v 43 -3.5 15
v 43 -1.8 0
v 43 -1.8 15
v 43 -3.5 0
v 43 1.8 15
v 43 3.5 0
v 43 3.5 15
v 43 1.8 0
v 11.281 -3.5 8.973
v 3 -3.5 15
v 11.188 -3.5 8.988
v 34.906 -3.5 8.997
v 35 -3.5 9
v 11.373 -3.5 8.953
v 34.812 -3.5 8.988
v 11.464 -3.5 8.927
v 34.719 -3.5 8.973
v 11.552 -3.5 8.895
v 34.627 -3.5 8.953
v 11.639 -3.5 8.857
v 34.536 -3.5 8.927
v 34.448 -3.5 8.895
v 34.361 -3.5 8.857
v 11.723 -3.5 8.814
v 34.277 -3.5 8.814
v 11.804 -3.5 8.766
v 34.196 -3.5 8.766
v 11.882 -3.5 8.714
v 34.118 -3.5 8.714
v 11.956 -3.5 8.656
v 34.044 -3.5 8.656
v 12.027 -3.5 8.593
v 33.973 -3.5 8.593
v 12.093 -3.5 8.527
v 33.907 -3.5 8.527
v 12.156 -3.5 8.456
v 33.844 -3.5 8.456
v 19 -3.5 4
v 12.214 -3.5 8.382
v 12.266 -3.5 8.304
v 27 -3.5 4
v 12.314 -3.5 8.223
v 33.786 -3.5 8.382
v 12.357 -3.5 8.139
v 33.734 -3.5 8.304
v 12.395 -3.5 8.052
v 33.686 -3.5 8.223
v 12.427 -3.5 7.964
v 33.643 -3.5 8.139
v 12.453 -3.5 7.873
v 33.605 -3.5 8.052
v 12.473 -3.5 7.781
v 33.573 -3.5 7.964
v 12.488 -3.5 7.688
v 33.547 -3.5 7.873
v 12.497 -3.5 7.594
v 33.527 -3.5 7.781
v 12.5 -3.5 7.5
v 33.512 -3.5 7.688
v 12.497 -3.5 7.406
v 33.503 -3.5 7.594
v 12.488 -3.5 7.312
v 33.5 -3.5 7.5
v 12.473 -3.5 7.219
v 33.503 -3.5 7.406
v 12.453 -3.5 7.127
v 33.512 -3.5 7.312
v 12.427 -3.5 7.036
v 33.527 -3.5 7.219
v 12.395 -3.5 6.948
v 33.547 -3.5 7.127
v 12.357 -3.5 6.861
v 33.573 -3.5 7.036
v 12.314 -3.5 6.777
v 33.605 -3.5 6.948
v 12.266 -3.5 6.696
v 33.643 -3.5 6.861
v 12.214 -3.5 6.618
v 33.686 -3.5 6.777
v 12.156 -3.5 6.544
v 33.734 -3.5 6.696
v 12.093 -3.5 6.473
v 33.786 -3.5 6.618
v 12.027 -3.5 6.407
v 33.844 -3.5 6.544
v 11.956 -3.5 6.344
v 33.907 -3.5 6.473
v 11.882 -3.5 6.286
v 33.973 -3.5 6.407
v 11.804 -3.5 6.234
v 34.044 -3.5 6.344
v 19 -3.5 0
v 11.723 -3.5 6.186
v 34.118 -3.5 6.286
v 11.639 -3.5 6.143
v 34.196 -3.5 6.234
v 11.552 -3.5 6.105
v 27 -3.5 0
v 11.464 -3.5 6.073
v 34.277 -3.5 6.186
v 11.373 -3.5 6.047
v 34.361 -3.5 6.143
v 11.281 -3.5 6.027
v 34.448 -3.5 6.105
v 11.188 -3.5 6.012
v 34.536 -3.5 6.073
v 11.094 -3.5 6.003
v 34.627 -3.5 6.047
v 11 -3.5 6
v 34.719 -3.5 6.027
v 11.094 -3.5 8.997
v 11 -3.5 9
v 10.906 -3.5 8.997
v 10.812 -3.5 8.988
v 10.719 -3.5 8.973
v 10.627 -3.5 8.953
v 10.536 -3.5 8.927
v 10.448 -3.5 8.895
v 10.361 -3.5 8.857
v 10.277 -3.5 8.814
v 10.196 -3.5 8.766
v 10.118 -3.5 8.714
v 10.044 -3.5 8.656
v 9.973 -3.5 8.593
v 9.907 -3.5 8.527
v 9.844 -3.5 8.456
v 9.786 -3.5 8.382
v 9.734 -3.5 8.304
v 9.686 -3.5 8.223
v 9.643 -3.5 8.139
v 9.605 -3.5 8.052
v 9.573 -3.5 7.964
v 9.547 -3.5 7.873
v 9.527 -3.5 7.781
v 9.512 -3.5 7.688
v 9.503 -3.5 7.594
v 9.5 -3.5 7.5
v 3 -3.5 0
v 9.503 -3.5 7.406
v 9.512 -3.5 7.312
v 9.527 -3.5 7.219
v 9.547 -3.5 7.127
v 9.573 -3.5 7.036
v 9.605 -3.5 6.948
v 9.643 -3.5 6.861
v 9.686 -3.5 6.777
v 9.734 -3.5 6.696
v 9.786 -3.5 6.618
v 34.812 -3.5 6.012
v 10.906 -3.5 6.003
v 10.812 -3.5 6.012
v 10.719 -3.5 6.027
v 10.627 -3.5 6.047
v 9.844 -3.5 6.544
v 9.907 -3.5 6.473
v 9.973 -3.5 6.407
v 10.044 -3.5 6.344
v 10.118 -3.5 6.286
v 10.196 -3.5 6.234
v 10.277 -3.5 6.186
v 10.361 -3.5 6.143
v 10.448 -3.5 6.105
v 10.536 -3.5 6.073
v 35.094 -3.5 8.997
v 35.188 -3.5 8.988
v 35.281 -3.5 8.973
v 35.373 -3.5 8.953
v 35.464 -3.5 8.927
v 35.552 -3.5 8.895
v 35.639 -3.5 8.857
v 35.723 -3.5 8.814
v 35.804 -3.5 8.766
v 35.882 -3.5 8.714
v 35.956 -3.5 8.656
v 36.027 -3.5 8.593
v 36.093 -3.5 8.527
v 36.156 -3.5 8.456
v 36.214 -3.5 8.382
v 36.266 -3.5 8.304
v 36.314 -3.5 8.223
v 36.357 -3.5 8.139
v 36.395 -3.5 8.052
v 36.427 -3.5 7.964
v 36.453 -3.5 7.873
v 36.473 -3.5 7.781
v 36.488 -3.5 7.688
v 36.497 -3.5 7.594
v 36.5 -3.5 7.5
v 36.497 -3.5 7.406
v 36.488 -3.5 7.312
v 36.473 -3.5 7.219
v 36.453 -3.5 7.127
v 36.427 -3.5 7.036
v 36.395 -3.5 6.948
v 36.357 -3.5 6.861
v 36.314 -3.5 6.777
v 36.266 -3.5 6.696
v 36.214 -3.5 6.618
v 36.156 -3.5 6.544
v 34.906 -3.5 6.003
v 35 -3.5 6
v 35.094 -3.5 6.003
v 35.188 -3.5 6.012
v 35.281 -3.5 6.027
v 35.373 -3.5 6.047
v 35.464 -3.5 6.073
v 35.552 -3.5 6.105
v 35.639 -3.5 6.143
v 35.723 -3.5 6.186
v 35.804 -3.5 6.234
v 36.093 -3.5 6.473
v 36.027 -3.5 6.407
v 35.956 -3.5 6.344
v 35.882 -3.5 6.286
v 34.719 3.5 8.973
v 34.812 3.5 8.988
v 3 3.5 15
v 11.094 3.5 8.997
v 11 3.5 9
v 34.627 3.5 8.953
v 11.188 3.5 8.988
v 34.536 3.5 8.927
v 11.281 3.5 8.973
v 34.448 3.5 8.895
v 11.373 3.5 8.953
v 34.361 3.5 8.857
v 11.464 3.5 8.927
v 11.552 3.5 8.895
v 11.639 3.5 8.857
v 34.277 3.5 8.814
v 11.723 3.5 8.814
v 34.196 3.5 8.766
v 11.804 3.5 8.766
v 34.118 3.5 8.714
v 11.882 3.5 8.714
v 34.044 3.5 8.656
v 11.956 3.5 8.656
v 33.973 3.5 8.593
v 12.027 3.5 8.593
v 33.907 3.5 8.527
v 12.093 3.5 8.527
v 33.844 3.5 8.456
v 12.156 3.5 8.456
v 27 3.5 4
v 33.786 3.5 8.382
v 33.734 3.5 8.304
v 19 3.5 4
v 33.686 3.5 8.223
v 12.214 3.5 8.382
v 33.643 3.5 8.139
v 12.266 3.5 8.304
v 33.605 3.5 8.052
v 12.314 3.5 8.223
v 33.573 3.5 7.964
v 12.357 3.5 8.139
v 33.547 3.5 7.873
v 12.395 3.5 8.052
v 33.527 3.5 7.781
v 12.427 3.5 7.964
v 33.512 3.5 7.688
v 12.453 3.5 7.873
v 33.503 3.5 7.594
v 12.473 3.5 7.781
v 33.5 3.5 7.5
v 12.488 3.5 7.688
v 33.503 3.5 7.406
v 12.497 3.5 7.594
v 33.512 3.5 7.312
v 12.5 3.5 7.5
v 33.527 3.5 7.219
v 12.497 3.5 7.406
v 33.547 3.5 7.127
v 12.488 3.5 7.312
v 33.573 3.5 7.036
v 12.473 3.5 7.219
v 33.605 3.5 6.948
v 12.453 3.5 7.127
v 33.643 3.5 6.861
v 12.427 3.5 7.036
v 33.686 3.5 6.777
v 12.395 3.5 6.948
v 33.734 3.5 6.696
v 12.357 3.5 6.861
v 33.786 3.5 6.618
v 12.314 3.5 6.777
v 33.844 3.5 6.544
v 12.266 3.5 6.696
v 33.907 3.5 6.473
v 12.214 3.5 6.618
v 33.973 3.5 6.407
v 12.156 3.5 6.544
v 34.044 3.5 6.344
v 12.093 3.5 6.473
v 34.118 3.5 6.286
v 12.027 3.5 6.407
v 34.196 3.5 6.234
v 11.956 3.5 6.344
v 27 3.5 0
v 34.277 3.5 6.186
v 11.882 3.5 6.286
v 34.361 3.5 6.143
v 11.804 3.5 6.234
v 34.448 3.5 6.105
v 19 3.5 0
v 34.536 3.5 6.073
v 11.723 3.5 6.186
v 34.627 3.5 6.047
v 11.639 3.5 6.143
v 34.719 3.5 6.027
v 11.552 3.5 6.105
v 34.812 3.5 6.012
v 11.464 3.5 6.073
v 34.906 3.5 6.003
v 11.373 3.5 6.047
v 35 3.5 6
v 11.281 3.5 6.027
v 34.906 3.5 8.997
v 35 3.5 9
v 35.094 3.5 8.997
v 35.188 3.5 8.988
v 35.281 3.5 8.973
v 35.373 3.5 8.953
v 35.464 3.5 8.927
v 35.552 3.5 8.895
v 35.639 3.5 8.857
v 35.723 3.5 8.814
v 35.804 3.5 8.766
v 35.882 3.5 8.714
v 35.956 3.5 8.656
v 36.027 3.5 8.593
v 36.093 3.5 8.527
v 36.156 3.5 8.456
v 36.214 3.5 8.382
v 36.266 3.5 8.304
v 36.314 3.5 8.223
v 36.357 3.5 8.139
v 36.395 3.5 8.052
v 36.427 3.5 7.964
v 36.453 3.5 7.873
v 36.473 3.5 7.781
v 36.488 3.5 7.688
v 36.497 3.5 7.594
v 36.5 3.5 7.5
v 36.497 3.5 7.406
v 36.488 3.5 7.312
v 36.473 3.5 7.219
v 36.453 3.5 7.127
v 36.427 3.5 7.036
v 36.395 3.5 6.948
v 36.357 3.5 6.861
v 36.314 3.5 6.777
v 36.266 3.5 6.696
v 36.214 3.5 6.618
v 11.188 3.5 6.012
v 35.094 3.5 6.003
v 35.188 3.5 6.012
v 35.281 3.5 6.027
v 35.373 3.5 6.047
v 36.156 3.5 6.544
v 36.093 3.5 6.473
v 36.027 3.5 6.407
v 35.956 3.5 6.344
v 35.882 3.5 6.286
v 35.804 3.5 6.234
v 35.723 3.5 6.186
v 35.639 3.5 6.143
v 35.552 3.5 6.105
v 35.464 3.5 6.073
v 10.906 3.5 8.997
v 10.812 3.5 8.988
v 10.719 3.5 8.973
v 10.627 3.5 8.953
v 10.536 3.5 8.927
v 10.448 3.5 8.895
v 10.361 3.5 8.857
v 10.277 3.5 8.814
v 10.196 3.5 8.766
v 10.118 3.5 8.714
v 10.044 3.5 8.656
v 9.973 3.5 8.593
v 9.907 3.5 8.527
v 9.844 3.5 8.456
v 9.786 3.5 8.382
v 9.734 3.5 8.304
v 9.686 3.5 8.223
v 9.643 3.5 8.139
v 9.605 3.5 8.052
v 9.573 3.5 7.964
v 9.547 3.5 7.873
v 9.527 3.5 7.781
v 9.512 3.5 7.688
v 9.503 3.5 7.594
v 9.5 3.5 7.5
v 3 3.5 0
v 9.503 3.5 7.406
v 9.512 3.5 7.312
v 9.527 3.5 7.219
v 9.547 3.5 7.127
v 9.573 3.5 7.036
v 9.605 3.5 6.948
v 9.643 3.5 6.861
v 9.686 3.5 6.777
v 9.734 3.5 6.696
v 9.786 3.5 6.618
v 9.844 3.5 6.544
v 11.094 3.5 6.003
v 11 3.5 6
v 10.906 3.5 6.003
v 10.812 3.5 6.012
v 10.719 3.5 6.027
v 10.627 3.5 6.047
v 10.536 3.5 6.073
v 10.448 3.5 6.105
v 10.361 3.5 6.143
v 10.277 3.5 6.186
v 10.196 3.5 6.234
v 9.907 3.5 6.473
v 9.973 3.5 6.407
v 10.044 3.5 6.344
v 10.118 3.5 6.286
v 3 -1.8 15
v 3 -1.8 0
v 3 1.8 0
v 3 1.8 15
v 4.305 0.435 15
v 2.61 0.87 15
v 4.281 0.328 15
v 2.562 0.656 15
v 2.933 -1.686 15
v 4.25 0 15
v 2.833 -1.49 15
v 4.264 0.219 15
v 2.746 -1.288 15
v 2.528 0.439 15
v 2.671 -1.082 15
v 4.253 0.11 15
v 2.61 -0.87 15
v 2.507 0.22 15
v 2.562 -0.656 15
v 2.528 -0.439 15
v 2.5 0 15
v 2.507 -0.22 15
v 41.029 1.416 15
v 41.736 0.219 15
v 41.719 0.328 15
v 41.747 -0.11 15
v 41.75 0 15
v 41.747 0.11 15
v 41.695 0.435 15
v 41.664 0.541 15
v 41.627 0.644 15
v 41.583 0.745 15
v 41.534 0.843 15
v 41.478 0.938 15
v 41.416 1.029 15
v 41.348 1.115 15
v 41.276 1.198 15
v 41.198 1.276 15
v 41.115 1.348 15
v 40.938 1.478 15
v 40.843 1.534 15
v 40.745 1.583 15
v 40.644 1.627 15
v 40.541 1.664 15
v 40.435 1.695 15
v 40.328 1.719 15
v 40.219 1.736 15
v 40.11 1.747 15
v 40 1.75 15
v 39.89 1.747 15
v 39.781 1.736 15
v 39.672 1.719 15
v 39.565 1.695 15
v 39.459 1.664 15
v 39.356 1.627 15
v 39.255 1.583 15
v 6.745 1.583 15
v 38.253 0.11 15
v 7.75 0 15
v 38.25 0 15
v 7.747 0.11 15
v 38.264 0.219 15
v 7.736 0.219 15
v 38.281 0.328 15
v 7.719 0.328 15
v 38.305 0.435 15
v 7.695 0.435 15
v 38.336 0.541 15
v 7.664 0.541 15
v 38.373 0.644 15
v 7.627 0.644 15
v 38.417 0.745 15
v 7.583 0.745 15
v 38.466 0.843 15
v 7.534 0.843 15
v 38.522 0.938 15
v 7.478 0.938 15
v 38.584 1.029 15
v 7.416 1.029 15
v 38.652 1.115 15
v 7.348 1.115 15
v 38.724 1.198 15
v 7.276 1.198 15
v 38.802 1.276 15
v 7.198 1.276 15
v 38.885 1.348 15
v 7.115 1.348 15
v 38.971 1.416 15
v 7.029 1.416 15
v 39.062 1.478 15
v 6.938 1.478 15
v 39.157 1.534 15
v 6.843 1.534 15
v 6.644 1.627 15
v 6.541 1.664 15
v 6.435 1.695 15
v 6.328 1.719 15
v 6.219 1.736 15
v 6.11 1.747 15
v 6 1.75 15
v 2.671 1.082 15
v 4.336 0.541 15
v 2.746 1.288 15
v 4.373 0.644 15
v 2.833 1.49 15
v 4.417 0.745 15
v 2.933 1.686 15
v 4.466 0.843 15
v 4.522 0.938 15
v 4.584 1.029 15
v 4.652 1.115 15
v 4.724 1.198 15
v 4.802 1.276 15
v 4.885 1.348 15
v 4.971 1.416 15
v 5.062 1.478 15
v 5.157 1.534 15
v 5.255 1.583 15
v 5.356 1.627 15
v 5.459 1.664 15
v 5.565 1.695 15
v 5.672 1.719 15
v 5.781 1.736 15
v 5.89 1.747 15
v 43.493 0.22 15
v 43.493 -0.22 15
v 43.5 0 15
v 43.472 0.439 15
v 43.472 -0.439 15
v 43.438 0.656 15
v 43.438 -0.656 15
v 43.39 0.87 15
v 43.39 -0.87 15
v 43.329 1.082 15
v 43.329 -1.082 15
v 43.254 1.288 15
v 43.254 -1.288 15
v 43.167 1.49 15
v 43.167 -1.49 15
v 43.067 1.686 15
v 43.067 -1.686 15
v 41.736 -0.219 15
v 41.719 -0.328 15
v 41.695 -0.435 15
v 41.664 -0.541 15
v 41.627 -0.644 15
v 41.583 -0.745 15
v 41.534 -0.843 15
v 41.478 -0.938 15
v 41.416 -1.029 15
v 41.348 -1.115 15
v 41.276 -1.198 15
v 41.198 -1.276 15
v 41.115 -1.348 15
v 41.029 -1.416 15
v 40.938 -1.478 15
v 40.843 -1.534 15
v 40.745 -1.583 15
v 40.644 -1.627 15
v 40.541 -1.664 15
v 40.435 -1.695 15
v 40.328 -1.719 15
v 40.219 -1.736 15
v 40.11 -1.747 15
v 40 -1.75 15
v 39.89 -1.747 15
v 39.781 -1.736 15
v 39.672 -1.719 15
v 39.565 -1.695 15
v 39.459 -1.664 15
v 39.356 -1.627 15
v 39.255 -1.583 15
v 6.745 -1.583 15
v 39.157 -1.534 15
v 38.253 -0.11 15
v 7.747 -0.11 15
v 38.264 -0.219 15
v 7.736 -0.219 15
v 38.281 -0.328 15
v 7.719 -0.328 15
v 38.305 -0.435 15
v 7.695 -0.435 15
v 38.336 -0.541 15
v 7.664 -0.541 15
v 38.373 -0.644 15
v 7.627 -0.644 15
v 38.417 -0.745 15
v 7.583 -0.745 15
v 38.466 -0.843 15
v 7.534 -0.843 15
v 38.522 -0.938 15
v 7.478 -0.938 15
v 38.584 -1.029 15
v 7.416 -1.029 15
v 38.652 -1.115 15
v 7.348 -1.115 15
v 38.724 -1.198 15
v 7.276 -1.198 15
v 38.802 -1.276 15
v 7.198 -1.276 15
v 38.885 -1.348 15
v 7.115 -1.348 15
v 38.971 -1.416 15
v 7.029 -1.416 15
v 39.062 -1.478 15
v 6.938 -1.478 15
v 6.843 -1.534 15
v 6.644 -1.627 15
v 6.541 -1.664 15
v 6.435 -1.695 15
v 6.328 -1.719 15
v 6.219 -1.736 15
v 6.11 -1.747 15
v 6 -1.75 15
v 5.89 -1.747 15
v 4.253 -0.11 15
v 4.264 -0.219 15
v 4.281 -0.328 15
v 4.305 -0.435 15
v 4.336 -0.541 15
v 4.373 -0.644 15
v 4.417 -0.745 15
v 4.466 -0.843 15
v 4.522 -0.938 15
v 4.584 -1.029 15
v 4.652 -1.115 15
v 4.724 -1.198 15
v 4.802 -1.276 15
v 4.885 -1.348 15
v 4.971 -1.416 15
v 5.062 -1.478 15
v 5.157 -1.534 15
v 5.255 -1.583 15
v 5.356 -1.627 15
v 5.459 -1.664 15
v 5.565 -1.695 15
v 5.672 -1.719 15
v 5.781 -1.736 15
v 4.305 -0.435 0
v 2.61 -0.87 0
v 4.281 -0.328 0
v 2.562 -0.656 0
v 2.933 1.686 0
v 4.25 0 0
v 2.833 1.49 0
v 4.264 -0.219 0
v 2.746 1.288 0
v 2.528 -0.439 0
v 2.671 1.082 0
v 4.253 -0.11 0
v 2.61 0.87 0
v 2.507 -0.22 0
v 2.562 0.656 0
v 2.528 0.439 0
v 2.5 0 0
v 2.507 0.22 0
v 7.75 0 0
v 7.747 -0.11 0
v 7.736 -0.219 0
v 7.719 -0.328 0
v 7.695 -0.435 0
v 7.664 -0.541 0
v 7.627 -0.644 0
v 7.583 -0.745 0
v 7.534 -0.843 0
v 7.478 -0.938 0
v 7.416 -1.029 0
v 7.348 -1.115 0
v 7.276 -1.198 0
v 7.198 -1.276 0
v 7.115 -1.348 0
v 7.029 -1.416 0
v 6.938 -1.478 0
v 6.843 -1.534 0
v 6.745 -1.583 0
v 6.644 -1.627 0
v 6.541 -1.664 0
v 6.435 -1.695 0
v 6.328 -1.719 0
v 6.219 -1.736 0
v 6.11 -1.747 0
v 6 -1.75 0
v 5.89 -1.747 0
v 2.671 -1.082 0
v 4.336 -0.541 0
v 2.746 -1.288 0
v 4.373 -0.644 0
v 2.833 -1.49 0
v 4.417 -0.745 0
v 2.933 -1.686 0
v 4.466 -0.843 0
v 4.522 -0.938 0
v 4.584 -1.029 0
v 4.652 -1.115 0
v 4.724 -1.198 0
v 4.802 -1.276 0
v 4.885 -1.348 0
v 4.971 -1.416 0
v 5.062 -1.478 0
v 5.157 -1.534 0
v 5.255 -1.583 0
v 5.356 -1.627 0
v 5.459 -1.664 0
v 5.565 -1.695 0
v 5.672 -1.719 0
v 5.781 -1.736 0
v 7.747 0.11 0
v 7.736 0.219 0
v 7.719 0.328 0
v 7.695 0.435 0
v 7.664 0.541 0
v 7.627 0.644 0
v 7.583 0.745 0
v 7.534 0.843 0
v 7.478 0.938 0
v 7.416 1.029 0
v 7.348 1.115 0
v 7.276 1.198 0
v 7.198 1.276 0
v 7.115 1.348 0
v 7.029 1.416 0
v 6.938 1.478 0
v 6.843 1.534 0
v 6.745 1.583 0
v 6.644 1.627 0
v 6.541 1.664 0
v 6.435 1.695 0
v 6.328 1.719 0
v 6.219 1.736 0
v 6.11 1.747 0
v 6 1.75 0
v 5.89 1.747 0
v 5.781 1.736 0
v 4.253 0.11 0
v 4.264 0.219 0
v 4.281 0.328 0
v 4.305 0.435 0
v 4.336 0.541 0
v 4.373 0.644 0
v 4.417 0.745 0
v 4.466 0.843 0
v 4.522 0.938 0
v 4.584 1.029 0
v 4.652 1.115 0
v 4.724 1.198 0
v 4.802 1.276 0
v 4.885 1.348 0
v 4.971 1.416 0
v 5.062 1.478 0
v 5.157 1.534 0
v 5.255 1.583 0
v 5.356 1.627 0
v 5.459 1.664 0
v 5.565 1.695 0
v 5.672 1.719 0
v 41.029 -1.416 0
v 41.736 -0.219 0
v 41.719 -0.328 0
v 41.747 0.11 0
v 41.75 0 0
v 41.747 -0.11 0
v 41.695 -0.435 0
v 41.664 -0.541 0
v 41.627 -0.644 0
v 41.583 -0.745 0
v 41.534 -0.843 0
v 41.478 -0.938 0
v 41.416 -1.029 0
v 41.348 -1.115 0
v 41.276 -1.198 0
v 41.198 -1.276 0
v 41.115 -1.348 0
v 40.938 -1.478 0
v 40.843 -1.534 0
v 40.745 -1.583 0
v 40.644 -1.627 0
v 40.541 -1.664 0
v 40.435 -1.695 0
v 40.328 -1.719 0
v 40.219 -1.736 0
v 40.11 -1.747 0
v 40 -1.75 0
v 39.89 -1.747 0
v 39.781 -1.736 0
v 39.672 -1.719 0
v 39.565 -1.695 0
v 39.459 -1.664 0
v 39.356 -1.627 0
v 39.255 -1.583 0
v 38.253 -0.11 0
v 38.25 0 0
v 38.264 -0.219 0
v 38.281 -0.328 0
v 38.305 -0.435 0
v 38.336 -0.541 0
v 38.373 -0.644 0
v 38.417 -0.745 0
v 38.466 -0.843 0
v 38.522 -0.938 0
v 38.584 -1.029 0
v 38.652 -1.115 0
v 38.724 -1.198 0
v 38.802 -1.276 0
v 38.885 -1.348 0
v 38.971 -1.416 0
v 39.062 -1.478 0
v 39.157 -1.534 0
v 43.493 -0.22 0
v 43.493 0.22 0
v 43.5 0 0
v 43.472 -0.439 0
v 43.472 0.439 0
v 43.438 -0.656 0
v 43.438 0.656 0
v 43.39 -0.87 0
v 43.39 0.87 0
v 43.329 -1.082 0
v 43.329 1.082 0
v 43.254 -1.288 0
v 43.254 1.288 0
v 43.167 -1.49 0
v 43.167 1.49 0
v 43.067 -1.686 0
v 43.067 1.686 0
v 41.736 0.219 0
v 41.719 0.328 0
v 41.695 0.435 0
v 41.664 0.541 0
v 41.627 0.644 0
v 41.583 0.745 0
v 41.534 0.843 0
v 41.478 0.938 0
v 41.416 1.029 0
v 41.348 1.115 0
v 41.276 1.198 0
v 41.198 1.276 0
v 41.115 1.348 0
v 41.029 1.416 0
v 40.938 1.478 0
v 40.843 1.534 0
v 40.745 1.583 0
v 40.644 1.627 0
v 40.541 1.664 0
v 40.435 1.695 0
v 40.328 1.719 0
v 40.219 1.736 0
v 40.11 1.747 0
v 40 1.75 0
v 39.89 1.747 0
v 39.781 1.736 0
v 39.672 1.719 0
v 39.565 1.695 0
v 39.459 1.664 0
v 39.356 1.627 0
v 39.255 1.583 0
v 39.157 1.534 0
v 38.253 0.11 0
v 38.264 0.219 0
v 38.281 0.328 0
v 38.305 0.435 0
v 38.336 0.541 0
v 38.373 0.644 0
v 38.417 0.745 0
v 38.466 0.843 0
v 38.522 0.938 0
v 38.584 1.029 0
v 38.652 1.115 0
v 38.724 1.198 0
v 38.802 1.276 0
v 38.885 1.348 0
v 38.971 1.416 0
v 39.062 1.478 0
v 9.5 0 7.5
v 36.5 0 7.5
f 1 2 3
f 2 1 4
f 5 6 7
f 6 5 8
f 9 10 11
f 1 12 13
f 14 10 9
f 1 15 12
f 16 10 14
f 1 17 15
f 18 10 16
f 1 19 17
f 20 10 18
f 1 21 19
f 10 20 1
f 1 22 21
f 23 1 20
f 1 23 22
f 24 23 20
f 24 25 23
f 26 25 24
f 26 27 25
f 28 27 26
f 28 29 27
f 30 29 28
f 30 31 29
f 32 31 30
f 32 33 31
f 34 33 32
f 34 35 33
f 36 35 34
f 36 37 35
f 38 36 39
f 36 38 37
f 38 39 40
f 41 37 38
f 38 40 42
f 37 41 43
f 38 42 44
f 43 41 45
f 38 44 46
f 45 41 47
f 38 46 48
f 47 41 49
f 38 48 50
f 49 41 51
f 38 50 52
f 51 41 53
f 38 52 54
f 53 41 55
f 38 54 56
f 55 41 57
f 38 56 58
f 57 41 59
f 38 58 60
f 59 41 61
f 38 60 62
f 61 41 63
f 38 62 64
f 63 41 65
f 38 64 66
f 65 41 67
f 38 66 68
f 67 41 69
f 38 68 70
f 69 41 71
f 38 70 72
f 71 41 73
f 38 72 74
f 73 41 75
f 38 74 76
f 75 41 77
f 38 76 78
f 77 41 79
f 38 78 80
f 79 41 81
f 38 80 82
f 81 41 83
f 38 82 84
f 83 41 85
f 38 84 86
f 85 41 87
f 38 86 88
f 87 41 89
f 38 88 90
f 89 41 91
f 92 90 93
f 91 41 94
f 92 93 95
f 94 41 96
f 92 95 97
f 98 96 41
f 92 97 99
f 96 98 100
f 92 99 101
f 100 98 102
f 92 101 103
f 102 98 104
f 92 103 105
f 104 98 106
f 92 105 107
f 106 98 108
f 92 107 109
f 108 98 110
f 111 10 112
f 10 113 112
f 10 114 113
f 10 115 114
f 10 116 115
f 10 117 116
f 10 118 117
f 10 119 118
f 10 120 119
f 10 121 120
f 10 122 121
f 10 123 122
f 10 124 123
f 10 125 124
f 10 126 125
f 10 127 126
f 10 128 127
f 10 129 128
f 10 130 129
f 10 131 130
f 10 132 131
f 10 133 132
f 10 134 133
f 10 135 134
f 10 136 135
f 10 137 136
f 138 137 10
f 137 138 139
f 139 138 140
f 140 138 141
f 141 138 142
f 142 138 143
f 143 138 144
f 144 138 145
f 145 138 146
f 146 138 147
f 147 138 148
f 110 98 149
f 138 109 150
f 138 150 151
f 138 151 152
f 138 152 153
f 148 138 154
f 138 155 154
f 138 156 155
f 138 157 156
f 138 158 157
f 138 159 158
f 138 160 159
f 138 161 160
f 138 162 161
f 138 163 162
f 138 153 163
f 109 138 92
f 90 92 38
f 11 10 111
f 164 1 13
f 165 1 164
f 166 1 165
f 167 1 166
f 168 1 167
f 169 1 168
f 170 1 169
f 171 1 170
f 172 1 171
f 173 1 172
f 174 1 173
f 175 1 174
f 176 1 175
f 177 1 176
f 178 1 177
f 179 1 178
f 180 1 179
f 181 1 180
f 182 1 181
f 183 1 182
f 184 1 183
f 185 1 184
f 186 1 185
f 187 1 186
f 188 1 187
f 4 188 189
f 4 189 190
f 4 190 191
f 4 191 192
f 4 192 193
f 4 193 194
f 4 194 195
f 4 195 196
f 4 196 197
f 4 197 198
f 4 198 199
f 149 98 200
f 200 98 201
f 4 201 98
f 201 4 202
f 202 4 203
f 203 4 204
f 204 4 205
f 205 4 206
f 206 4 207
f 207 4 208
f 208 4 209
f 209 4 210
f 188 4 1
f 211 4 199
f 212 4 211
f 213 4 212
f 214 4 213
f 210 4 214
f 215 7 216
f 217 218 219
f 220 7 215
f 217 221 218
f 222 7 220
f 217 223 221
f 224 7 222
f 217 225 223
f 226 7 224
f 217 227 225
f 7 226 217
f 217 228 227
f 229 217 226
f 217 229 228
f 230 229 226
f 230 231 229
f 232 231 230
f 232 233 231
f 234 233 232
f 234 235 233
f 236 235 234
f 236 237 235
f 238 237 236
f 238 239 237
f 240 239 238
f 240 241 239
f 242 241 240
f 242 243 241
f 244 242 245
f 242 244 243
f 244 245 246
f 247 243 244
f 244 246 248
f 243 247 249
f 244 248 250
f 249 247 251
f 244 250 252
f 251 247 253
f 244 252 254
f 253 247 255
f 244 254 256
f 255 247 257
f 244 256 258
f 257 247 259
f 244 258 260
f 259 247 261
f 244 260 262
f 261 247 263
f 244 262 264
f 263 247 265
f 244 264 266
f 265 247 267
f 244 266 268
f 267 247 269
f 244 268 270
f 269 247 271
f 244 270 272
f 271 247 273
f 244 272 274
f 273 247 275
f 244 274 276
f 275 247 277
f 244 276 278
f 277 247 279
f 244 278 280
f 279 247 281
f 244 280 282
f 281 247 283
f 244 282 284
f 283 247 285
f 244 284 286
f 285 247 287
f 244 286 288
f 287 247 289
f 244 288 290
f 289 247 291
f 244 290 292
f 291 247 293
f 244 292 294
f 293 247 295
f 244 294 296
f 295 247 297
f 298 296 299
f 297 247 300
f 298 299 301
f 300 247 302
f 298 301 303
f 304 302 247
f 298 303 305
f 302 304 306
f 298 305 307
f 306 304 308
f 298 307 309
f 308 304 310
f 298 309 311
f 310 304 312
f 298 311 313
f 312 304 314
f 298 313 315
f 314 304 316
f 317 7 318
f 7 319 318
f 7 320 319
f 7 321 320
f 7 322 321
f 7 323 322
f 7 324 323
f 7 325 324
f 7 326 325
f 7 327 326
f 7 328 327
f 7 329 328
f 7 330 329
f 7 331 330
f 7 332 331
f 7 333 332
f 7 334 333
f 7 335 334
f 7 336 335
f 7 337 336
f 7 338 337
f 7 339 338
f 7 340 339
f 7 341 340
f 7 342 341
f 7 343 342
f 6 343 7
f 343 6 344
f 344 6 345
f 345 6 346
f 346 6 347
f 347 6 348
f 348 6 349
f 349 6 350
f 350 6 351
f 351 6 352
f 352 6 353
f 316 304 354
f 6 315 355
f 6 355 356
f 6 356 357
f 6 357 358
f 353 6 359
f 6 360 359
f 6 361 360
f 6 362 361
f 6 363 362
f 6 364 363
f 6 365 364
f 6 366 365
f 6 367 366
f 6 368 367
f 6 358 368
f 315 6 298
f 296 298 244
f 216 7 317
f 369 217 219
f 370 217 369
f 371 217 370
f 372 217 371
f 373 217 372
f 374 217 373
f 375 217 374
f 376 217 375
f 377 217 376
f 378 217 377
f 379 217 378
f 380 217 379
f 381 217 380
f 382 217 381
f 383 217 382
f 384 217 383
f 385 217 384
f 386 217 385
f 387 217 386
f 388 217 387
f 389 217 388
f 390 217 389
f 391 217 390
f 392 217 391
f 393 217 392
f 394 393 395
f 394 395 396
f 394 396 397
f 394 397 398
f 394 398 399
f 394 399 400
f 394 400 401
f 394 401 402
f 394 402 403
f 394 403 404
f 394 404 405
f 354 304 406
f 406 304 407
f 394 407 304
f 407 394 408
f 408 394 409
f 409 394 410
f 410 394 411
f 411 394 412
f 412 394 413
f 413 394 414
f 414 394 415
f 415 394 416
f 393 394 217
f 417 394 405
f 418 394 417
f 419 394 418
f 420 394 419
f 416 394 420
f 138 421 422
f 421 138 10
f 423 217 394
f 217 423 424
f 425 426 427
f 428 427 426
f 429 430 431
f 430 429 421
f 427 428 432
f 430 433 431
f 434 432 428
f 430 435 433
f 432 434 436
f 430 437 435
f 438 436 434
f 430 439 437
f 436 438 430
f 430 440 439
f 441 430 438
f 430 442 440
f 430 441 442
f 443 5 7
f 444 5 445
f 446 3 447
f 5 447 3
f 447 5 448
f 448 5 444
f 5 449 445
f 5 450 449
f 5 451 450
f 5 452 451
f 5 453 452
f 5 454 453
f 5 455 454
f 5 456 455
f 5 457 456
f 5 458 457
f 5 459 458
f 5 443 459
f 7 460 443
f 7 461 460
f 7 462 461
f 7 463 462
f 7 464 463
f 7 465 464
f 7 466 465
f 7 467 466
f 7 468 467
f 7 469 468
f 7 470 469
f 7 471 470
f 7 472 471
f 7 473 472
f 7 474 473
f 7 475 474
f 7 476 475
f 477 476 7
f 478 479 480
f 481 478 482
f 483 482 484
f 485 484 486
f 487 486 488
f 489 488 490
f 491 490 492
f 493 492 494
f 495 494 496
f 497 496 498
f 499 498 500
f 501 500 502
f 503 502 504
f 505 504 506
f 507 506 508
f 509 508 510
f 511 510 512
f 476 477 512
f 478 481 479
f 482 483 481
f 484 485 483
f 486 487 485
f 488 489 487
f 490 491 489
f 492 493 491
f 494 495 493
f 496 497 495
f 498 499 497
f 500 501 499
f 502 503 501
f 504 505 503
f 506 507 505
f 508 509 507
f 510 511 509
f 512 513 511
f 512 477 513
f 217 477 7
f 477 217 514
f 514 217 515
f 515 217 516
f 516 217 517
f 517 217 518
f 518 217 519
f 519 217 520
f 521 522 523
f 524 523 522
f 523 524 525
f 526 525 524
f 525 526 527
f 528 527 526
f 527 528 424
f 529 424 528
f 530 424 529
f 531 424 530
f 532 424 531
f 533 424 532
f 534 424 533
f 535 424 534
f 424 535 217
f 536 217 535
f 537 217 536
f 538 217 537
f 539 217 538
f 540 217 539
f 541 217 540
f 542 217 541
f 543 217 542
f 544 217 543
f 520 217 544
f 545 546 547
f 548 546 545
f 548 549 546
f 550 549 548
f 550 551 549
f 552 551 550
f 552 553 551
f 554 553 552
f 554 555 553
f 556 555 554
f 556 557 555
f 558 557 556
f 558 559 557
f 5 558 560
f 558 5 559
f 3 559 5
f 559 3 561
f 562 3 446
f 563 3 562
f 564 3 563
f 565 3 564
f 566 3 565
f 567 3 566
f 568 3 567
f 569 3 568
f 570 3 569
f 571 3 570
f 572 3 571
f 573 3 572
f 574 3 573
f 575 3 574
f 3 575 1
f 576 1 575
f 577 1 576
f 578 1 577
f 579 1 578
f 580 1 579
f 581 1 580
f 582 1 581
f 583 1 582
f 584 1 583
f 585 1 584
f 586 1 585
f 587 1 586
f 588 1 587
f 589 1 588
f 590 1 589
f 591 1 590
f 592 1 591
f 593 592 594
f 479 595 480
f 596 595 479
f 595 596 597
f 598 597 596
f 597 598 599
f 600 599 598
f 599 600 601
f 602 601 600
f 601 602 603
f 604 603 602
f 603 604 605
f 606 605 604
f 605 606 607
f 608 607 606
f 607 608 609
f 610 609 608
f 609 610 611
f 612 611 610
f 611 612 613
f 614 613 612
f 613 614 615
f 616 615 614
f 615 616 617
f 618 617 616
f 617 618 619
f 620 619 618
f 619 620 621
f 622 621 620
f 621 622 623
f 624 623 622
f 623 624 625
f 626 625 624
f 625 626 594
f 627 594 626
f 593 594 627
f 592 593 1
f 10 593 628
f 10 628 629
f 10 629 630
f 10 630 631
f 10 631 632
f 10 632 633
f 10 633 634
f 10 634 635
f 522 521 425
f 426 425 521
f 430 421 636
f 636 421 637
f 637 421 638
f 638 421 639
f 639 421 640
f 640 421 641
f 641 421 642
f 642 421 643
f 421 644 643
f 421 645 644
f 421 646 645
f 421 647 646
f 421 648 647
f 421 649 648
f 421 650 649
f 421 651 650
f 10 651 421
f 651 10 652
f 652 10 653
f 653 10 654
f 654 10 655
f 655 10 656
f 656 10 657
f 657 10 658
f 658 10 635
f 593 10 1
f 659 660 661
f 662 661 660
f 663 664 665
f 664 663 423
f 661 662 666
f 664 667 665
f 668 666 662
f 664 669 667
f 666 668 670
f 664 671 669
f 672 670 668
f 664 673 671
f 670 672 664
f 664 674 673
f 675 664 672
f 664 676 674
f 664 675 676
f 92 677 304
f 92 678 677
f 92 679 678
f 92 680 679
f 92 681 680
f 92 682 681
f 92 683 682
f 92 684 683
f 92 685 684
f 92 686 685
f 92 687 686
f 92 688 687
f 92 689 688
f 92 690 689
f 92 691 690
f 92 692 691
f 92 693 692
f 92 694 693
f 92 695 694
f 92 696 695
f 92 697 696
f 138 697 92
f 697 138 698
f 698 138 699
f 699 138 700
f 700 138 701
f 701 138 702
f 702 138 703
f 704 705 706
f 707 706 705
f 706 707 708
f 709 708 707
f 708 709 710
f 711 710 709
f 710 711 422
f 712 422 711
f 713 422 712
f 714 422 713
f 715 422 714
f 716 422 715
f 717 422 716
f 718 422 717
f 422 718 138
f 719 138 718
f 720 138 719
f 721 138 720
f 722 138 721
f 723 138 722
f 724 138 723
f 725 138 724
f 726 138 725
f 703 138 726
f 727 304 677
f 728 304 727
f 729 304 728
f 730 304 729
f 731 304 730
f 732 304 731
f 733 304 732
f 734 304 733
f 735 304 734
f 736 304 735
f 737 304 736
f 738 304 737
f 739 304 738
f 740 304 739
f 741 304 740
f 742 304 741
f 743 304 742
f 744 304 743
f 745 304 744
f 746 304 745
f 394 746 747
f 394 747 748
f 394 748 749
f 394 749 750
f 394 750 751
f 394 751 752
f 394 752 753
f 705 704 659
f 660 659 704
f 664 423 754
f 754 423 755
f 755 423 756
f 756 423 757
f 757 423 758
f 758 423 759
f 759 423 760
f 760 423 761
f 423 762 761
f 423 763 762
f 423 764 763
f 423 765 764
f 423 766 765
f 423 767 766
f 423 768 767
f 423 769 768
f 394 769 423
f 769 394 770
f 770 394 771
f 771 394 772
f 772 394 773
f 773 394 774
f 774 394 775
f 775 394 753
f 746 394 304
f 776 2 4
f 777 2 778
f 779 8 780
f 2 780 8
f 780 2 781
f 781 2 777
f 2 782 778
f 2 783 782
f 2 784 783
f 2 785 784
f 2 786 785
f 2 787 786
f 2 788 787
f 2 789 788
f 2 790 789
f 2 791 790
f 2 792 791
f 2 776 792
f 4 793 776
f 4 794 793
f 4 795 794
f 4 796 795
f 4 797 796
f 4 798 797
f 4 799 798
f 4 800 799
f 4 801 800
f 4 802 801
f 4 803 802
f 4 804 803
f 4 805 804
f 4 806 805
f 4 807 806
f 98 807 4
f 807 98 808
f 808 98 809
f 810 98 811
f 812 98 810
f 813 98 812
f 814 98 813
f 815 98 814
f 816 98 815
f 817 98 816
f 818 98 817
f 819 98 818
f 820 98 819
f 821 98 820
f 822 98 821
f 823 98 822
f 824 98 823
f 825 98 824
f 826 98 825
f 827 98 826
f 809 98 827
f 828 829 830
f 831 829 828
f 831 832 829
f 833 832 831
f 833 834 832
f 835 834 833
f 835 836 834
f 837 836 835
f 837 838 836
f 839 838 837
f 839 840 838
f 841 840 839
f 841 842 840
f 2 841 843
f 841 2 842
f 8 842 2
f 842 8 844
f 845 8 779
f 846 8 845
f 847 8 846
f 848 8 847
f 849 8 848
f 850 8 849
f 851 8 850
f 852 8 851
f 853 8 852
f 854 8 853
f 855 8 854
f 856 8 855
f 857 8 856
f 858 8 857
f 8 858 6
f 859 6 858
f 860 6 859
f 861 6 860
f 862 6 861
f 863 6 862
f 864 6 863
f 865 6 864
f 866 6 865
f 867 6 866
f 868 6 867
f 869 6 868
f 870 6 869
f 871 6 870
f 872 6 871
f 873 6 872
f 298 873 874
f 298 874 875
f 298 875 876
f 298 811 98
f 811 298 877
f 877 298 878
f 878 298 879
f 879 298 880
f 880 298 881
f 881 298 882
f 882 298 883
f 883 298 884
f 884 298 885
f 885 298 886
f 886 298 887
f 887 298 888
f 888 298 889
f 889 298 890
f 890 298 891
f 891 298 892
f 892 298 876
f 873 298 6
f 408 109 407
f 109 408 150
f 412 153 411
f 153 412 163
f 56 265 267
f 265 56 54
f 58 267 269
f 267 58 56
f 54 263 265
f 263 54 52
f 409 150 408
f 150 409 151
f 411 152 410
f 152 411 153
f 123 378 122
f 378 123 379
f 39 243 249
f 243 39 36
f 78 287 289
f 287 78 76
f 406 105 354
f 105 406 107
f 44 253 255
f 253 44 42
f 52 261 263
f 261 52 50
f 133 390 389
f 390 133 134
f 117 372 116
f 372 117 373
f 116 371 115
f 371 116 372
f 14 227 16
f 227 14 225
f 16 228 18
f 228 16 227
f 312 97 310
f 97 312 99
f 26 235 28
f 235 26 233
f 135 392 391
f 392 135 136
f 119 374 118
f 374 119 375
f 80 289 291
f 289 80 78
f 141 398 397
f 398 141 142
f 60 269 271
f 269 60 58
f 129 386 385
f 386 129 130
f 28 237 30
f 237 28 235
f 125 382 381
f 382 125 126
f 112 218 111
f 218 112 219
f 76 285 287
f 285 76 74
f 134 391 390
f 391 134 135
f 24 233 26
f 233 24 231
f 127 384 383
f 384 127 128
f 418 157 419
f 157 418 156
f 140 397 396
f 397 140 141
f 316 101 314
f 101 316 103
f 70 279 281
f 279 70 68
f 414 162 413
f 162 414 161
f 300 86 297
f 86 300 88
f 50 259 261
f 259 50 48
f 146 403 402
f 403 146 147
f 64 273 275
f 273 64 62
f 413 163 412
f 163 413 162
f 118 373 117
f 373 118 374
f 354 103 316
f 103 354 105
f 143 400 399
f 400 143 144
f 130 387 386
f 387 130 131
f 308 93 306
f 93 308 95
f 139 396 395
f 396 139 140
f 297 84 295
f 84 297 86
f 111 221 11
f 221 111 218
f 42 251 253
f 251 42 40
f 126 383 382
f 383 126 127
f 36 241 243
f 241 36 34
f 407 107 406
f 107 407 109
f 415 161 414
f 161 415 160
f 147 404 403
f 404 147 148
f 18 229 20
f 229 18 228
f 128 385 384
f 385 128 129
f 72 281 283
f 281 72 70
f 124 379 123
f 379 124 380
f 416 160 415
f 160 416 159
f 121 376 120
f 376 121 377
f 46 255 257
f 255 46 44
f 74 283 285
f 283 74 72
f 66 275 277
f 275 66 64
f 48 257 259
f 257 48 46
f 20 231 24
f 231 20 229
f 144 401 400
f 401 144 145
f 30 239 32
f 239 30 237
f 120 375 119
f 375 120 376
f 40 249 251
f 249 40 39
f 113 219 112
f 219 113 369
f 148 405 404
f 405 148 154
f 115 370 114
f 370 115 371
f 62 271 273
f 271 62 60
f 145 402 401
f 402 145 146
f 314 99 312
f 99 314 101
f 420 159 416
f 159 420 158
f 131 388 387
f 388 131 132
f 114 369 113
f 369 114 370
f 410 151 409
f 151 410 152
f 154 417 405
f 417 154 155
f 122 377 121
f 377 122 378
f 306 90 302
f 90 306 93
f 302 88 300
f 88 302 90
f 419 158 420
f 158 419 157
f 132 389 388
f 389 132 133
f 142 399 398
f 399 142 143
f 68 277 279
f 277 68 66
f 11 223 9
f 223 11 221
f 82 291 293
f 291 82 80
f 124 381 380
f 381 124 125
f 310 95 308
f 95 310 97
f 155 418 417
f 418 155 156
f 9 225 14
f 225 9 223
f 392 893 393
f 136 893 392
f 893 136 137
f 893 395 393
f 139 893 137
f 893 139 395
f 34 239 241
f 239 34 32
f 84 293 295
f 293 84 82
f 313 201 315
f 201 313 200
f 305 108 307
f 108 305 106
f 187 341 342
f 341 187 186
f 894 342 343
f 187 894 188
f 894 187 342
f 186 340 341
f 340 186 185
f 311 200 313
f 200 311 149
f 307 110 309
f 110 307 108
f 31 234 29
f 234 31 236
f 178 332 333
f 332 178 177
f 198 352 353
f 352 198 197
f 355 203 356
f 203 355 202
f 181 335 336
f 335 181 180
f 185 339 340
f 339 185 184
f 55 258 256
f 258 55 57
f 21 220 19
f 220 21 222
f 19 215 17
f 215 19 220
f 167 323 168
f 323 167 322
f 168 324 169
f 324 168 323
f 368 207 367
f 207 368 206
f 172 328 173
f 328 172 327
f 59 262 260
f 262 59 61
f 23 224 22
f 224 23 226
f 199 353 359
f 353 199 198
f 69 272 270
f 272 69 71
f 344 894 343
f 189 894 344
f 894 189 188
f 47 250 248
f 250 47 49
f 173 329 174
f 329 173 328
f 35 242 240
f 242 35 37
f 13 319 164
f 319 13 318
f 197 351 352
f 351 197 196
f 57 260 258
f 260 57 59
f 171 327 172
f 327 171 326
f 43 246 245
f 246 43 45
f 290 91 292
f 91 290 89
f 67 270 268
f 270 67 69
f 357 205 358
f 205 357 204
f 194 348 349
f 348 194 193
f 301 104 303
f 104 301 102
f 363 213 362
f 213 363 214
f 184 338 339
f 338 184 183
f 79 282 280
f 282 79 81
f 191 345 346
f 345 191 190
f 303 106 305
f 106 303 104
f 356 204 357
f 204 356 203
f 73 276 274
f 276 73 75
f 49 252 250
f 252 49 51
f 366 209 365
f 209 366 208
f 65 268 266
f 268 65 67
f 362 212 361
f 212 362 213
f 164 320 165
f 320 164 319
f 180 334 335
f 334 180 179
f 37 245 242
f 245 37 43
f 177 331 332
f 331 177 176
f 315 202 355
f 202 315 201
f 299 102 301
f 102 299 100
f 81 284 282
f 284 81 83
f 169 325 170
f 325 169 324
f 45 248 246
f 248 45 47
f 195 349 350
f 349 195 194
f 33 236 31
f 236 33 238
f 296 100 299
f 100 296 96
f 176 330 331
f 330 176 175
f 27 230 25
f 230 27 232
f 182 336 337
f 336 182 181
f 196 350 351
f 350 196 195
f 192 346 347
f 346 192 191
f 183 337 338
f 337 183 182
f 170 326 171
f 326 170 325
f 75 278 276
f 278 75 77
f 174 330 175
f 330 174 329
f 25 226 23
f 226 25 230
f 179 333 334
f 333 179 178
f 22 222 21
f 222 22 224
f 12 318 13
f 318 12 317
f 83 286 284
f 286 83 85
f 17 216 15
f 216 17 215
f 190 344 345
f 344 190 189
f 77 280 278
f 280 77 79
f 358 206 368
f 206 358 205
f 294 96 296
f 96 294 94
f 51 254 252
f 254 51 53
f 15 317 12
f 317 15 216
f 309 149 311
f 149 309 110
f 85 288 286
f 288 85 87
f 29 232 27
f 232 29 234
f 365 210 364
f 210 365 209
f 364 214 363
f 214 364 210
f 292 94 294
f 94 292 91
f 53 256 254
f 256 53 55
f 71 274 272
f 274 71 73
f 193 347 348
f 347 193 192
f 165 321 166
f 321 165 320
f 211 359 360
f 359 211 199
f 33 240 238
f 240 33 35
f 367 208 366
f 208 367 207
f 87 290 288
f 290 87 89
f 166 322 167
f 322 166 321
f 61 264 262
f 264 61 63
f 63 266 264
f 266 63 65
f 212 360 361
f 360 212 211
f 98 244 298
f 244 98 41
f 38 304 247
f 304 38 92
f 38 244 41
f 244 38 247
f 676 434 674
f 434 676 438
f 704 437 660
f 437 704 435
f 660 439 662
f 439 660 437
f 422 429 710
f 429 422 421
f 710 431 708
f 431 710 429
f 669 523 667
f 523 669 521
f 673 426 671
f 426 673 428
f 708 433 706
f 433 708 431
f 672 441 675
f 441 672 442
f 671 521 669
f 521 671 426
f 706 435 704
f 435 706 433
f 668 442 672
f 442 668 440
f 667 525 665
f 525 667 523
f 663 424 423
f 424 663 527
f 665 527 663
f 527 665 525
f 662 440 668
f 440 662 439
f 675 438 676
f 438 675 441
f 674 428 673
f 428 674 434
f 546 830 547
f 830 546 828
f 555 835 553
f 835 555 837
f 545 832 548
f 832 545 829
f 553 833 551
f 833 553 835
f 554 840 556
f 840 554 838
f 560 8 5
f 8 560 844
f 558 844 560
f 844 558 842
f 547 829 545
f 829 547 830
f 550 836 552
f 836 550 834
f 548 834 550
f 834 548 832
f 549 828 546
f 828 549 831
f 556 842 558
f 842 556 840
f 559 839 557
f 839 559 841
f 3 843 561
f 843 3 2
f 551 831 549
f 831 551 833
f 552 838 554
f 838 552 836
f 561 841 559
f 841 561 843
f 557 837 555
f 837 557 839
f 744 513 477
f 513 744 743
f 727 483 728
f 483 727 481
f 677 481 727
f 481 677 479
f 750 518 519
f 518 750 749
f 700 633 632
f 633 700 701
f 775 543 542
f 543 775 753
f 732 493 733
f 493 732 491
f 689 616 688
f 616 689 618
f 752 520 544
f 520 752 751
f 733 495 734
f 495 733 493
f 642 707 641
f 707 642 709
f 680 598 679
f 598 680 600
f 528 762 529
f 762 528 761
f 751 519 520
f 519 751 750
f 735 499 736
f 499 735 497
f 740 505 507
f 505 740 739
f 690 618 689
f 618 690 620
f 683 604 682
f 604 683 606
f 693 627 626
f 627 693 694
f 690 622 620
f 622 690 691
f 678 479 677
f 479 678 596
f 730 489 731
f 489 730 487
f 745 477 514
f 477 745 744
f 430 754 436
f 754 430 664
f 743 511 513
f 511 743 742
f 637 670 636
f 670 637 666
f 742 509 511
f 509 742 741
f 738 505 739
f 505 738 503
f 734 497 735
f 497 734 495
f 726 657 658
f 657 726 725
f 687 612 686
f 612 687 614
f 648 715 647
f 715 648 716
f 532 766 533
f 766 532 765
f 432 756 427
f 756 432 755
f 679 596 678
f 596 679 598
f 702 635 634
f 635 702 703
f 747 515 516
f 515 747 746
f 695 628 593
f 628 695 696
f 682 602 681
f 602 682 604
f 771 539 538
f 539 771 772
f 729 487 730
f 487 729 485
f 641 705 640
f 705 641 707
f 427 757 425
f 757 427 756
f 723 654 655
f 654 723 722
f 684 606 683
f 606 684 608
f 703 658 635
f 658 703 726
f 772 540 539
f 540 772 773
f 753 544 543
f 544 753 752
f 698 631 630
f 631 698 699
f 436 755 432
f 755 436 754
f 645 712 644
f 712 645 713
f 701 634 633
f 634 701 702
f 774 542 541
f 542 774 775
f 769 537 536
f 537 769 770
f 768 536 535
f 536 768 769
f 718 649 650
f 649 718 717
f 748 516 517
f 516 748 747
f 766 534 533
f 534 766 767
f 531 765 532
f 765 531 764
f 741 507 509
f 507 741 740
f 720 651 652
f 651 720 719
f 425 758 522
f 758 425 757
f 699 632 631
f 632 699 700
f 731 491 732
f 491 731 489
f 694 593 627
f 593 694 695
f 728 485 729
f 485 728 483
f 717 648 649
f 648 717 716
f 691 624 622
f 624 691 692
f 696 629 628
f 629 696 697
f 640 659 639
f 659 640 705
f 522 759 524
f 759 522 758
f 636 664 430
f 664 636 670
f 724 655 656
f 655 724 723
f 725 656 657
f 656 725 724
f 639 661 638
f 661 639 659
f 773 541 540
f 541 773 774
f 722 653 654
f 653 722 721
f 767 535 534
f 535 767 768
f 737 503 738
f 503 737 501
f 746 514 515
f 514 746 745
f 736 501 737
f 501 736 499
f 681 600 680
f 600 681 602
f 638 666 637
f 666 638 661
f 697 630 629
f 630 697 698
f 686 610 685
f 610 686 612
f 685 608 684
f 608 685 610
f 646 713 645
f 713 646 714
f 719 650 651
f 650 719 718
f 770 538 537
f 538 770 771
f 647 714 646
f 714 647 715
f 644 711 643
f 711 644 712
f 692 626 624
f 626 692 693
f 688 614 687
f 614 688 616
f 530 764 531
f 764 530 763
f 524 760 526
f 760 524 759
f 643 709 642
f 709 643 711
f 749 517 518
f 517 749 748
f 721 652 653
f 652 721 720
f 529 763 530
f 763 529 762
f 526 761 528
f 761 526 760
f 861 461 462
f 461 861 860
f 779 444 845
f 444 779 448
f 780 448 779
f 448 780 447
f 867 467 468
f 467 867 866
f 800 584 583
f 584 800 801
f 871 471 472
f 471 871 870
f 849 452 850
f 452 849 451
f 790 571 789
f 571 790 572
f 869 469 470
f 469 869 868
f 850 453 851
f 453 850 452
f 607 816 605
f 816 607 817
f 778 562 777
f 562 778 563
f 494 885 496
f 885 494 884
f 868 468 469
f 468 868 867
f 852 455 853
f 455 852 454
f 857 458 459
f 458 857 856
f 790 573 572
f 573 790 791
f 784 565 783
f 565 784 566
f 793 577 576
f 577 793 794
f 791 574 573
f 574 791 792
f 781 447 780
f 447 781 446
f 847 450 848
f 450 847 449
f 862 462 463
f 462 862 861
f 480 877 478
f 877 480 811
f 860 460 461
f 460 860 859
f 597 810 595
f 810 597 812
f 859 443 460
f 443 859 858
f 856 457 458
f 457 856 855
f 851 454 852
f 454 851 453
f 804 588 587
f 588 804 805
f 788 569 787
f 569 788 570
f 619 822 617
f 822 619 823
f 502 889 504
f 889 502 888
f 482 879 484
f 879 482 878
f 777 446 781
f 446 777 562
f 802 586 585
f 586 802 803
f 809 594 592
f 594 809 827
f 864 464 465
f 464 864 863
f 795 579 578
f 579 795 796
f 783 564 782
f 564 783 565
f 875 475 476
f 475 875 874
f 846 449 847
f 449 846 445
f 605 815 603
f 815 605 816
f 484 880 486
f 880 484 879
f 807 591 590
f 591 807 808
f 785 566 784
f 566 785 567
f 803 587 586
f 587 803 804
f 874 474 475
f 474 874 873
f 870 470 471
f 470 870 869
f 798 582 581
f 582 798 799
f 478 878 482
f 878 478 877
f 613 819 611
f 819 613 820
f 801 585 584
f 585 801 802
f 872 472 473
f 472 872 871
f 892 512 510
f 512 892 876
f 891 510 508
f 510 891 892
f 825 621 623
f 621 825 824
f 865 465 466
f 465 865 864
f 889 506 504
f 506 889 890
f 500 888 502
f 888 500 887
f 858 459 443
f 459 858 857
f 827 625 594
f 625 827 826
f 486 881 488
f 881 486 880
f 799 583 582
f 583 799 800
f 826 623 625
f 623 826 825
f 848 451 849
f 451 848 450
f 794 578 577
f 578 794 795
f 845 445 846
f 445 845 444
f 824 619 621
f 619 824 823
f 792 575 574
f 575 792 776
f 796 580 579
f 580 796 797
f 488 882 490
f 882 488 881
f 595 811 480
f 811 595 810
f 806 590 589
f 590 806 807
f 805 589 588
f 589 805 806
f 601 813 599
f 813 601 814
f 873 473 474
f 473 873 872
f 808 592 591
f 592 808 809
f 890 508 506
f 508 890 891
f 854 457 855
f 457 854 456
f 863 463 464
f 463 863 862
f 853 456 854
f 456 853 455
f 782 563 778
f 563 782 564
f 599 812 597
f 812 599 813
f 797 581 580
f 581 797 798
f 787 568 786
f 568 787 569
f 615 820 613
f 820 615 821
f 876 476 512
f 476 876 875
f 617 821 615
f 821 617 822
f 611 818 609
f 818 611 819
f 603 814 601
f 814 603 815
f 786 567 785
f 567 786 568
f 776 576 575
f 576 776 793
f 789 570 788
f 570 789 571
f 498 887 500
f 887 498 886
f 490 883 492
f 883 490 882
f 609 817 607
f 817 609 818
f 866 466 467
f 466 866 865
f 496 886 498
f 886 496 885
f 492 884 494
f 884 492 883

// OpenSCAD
/****************************************************************
* title: rocket payload spacer
* author: Boris du Reau
* version: 1.0
* date: 07/02/2018
* 
* Description: print a payload spacer
* Howto use it:
* Modify the variables values so that it fits to your rocket tube 
* then just click on "compile and render" 
* Note that all units ar metrics
*****************************************************************/

/* adjust variables here */ 
/* It is recommended to print a sample to make sure that the diameter is correct */

spacerHeight = 7 ;
spacerWidth = 15 ;
spacerLenght = 40 ;
spacerHoleDiam = 3.5;
spacerHoleDist = 35;
spacerPlateHoleDiam = 3;
resolution = 100;

$fn=resolution; 

module berceau()
{
difference () {
cube([spacerLenght, spacerWidth, spacerHeight]);
translate ([spacerHoleDiam*2+1,spacerWidth/2,0])cylinder(h=spacerWidth, r=spacerPlateHoleDiam/2);
translate ([spacerLenght-(spacerHoleDiam*2+1),spacerWidth/2,0])cylinder(h=spacerWidth, r=spacerPlateHoleDiam/2);
translate ([(spacerLenght/2)-4,0,0])cube([8, 4, spacerHeight]);
}

}

module mybec () {
translate ([6,0,0])cylinder (h=spacerWidth, r=3.5);
rotate ([90,0,0])translate ([3,0,-3.5])berceau();
translate ([spacerLenght,0,0]) cylinder (h=spacerWidth, r=3.5);
}

//mybec ();
difference () {mybec ();
translate ([6,0,-1]) cylinder (h=spacerWidth+2, r=spacerHoleDiam/2);
translate ([spacerLenght,0,-1]) cylinder (h=spacerWidth+2, r=spacerHoleDiam/2);
}
